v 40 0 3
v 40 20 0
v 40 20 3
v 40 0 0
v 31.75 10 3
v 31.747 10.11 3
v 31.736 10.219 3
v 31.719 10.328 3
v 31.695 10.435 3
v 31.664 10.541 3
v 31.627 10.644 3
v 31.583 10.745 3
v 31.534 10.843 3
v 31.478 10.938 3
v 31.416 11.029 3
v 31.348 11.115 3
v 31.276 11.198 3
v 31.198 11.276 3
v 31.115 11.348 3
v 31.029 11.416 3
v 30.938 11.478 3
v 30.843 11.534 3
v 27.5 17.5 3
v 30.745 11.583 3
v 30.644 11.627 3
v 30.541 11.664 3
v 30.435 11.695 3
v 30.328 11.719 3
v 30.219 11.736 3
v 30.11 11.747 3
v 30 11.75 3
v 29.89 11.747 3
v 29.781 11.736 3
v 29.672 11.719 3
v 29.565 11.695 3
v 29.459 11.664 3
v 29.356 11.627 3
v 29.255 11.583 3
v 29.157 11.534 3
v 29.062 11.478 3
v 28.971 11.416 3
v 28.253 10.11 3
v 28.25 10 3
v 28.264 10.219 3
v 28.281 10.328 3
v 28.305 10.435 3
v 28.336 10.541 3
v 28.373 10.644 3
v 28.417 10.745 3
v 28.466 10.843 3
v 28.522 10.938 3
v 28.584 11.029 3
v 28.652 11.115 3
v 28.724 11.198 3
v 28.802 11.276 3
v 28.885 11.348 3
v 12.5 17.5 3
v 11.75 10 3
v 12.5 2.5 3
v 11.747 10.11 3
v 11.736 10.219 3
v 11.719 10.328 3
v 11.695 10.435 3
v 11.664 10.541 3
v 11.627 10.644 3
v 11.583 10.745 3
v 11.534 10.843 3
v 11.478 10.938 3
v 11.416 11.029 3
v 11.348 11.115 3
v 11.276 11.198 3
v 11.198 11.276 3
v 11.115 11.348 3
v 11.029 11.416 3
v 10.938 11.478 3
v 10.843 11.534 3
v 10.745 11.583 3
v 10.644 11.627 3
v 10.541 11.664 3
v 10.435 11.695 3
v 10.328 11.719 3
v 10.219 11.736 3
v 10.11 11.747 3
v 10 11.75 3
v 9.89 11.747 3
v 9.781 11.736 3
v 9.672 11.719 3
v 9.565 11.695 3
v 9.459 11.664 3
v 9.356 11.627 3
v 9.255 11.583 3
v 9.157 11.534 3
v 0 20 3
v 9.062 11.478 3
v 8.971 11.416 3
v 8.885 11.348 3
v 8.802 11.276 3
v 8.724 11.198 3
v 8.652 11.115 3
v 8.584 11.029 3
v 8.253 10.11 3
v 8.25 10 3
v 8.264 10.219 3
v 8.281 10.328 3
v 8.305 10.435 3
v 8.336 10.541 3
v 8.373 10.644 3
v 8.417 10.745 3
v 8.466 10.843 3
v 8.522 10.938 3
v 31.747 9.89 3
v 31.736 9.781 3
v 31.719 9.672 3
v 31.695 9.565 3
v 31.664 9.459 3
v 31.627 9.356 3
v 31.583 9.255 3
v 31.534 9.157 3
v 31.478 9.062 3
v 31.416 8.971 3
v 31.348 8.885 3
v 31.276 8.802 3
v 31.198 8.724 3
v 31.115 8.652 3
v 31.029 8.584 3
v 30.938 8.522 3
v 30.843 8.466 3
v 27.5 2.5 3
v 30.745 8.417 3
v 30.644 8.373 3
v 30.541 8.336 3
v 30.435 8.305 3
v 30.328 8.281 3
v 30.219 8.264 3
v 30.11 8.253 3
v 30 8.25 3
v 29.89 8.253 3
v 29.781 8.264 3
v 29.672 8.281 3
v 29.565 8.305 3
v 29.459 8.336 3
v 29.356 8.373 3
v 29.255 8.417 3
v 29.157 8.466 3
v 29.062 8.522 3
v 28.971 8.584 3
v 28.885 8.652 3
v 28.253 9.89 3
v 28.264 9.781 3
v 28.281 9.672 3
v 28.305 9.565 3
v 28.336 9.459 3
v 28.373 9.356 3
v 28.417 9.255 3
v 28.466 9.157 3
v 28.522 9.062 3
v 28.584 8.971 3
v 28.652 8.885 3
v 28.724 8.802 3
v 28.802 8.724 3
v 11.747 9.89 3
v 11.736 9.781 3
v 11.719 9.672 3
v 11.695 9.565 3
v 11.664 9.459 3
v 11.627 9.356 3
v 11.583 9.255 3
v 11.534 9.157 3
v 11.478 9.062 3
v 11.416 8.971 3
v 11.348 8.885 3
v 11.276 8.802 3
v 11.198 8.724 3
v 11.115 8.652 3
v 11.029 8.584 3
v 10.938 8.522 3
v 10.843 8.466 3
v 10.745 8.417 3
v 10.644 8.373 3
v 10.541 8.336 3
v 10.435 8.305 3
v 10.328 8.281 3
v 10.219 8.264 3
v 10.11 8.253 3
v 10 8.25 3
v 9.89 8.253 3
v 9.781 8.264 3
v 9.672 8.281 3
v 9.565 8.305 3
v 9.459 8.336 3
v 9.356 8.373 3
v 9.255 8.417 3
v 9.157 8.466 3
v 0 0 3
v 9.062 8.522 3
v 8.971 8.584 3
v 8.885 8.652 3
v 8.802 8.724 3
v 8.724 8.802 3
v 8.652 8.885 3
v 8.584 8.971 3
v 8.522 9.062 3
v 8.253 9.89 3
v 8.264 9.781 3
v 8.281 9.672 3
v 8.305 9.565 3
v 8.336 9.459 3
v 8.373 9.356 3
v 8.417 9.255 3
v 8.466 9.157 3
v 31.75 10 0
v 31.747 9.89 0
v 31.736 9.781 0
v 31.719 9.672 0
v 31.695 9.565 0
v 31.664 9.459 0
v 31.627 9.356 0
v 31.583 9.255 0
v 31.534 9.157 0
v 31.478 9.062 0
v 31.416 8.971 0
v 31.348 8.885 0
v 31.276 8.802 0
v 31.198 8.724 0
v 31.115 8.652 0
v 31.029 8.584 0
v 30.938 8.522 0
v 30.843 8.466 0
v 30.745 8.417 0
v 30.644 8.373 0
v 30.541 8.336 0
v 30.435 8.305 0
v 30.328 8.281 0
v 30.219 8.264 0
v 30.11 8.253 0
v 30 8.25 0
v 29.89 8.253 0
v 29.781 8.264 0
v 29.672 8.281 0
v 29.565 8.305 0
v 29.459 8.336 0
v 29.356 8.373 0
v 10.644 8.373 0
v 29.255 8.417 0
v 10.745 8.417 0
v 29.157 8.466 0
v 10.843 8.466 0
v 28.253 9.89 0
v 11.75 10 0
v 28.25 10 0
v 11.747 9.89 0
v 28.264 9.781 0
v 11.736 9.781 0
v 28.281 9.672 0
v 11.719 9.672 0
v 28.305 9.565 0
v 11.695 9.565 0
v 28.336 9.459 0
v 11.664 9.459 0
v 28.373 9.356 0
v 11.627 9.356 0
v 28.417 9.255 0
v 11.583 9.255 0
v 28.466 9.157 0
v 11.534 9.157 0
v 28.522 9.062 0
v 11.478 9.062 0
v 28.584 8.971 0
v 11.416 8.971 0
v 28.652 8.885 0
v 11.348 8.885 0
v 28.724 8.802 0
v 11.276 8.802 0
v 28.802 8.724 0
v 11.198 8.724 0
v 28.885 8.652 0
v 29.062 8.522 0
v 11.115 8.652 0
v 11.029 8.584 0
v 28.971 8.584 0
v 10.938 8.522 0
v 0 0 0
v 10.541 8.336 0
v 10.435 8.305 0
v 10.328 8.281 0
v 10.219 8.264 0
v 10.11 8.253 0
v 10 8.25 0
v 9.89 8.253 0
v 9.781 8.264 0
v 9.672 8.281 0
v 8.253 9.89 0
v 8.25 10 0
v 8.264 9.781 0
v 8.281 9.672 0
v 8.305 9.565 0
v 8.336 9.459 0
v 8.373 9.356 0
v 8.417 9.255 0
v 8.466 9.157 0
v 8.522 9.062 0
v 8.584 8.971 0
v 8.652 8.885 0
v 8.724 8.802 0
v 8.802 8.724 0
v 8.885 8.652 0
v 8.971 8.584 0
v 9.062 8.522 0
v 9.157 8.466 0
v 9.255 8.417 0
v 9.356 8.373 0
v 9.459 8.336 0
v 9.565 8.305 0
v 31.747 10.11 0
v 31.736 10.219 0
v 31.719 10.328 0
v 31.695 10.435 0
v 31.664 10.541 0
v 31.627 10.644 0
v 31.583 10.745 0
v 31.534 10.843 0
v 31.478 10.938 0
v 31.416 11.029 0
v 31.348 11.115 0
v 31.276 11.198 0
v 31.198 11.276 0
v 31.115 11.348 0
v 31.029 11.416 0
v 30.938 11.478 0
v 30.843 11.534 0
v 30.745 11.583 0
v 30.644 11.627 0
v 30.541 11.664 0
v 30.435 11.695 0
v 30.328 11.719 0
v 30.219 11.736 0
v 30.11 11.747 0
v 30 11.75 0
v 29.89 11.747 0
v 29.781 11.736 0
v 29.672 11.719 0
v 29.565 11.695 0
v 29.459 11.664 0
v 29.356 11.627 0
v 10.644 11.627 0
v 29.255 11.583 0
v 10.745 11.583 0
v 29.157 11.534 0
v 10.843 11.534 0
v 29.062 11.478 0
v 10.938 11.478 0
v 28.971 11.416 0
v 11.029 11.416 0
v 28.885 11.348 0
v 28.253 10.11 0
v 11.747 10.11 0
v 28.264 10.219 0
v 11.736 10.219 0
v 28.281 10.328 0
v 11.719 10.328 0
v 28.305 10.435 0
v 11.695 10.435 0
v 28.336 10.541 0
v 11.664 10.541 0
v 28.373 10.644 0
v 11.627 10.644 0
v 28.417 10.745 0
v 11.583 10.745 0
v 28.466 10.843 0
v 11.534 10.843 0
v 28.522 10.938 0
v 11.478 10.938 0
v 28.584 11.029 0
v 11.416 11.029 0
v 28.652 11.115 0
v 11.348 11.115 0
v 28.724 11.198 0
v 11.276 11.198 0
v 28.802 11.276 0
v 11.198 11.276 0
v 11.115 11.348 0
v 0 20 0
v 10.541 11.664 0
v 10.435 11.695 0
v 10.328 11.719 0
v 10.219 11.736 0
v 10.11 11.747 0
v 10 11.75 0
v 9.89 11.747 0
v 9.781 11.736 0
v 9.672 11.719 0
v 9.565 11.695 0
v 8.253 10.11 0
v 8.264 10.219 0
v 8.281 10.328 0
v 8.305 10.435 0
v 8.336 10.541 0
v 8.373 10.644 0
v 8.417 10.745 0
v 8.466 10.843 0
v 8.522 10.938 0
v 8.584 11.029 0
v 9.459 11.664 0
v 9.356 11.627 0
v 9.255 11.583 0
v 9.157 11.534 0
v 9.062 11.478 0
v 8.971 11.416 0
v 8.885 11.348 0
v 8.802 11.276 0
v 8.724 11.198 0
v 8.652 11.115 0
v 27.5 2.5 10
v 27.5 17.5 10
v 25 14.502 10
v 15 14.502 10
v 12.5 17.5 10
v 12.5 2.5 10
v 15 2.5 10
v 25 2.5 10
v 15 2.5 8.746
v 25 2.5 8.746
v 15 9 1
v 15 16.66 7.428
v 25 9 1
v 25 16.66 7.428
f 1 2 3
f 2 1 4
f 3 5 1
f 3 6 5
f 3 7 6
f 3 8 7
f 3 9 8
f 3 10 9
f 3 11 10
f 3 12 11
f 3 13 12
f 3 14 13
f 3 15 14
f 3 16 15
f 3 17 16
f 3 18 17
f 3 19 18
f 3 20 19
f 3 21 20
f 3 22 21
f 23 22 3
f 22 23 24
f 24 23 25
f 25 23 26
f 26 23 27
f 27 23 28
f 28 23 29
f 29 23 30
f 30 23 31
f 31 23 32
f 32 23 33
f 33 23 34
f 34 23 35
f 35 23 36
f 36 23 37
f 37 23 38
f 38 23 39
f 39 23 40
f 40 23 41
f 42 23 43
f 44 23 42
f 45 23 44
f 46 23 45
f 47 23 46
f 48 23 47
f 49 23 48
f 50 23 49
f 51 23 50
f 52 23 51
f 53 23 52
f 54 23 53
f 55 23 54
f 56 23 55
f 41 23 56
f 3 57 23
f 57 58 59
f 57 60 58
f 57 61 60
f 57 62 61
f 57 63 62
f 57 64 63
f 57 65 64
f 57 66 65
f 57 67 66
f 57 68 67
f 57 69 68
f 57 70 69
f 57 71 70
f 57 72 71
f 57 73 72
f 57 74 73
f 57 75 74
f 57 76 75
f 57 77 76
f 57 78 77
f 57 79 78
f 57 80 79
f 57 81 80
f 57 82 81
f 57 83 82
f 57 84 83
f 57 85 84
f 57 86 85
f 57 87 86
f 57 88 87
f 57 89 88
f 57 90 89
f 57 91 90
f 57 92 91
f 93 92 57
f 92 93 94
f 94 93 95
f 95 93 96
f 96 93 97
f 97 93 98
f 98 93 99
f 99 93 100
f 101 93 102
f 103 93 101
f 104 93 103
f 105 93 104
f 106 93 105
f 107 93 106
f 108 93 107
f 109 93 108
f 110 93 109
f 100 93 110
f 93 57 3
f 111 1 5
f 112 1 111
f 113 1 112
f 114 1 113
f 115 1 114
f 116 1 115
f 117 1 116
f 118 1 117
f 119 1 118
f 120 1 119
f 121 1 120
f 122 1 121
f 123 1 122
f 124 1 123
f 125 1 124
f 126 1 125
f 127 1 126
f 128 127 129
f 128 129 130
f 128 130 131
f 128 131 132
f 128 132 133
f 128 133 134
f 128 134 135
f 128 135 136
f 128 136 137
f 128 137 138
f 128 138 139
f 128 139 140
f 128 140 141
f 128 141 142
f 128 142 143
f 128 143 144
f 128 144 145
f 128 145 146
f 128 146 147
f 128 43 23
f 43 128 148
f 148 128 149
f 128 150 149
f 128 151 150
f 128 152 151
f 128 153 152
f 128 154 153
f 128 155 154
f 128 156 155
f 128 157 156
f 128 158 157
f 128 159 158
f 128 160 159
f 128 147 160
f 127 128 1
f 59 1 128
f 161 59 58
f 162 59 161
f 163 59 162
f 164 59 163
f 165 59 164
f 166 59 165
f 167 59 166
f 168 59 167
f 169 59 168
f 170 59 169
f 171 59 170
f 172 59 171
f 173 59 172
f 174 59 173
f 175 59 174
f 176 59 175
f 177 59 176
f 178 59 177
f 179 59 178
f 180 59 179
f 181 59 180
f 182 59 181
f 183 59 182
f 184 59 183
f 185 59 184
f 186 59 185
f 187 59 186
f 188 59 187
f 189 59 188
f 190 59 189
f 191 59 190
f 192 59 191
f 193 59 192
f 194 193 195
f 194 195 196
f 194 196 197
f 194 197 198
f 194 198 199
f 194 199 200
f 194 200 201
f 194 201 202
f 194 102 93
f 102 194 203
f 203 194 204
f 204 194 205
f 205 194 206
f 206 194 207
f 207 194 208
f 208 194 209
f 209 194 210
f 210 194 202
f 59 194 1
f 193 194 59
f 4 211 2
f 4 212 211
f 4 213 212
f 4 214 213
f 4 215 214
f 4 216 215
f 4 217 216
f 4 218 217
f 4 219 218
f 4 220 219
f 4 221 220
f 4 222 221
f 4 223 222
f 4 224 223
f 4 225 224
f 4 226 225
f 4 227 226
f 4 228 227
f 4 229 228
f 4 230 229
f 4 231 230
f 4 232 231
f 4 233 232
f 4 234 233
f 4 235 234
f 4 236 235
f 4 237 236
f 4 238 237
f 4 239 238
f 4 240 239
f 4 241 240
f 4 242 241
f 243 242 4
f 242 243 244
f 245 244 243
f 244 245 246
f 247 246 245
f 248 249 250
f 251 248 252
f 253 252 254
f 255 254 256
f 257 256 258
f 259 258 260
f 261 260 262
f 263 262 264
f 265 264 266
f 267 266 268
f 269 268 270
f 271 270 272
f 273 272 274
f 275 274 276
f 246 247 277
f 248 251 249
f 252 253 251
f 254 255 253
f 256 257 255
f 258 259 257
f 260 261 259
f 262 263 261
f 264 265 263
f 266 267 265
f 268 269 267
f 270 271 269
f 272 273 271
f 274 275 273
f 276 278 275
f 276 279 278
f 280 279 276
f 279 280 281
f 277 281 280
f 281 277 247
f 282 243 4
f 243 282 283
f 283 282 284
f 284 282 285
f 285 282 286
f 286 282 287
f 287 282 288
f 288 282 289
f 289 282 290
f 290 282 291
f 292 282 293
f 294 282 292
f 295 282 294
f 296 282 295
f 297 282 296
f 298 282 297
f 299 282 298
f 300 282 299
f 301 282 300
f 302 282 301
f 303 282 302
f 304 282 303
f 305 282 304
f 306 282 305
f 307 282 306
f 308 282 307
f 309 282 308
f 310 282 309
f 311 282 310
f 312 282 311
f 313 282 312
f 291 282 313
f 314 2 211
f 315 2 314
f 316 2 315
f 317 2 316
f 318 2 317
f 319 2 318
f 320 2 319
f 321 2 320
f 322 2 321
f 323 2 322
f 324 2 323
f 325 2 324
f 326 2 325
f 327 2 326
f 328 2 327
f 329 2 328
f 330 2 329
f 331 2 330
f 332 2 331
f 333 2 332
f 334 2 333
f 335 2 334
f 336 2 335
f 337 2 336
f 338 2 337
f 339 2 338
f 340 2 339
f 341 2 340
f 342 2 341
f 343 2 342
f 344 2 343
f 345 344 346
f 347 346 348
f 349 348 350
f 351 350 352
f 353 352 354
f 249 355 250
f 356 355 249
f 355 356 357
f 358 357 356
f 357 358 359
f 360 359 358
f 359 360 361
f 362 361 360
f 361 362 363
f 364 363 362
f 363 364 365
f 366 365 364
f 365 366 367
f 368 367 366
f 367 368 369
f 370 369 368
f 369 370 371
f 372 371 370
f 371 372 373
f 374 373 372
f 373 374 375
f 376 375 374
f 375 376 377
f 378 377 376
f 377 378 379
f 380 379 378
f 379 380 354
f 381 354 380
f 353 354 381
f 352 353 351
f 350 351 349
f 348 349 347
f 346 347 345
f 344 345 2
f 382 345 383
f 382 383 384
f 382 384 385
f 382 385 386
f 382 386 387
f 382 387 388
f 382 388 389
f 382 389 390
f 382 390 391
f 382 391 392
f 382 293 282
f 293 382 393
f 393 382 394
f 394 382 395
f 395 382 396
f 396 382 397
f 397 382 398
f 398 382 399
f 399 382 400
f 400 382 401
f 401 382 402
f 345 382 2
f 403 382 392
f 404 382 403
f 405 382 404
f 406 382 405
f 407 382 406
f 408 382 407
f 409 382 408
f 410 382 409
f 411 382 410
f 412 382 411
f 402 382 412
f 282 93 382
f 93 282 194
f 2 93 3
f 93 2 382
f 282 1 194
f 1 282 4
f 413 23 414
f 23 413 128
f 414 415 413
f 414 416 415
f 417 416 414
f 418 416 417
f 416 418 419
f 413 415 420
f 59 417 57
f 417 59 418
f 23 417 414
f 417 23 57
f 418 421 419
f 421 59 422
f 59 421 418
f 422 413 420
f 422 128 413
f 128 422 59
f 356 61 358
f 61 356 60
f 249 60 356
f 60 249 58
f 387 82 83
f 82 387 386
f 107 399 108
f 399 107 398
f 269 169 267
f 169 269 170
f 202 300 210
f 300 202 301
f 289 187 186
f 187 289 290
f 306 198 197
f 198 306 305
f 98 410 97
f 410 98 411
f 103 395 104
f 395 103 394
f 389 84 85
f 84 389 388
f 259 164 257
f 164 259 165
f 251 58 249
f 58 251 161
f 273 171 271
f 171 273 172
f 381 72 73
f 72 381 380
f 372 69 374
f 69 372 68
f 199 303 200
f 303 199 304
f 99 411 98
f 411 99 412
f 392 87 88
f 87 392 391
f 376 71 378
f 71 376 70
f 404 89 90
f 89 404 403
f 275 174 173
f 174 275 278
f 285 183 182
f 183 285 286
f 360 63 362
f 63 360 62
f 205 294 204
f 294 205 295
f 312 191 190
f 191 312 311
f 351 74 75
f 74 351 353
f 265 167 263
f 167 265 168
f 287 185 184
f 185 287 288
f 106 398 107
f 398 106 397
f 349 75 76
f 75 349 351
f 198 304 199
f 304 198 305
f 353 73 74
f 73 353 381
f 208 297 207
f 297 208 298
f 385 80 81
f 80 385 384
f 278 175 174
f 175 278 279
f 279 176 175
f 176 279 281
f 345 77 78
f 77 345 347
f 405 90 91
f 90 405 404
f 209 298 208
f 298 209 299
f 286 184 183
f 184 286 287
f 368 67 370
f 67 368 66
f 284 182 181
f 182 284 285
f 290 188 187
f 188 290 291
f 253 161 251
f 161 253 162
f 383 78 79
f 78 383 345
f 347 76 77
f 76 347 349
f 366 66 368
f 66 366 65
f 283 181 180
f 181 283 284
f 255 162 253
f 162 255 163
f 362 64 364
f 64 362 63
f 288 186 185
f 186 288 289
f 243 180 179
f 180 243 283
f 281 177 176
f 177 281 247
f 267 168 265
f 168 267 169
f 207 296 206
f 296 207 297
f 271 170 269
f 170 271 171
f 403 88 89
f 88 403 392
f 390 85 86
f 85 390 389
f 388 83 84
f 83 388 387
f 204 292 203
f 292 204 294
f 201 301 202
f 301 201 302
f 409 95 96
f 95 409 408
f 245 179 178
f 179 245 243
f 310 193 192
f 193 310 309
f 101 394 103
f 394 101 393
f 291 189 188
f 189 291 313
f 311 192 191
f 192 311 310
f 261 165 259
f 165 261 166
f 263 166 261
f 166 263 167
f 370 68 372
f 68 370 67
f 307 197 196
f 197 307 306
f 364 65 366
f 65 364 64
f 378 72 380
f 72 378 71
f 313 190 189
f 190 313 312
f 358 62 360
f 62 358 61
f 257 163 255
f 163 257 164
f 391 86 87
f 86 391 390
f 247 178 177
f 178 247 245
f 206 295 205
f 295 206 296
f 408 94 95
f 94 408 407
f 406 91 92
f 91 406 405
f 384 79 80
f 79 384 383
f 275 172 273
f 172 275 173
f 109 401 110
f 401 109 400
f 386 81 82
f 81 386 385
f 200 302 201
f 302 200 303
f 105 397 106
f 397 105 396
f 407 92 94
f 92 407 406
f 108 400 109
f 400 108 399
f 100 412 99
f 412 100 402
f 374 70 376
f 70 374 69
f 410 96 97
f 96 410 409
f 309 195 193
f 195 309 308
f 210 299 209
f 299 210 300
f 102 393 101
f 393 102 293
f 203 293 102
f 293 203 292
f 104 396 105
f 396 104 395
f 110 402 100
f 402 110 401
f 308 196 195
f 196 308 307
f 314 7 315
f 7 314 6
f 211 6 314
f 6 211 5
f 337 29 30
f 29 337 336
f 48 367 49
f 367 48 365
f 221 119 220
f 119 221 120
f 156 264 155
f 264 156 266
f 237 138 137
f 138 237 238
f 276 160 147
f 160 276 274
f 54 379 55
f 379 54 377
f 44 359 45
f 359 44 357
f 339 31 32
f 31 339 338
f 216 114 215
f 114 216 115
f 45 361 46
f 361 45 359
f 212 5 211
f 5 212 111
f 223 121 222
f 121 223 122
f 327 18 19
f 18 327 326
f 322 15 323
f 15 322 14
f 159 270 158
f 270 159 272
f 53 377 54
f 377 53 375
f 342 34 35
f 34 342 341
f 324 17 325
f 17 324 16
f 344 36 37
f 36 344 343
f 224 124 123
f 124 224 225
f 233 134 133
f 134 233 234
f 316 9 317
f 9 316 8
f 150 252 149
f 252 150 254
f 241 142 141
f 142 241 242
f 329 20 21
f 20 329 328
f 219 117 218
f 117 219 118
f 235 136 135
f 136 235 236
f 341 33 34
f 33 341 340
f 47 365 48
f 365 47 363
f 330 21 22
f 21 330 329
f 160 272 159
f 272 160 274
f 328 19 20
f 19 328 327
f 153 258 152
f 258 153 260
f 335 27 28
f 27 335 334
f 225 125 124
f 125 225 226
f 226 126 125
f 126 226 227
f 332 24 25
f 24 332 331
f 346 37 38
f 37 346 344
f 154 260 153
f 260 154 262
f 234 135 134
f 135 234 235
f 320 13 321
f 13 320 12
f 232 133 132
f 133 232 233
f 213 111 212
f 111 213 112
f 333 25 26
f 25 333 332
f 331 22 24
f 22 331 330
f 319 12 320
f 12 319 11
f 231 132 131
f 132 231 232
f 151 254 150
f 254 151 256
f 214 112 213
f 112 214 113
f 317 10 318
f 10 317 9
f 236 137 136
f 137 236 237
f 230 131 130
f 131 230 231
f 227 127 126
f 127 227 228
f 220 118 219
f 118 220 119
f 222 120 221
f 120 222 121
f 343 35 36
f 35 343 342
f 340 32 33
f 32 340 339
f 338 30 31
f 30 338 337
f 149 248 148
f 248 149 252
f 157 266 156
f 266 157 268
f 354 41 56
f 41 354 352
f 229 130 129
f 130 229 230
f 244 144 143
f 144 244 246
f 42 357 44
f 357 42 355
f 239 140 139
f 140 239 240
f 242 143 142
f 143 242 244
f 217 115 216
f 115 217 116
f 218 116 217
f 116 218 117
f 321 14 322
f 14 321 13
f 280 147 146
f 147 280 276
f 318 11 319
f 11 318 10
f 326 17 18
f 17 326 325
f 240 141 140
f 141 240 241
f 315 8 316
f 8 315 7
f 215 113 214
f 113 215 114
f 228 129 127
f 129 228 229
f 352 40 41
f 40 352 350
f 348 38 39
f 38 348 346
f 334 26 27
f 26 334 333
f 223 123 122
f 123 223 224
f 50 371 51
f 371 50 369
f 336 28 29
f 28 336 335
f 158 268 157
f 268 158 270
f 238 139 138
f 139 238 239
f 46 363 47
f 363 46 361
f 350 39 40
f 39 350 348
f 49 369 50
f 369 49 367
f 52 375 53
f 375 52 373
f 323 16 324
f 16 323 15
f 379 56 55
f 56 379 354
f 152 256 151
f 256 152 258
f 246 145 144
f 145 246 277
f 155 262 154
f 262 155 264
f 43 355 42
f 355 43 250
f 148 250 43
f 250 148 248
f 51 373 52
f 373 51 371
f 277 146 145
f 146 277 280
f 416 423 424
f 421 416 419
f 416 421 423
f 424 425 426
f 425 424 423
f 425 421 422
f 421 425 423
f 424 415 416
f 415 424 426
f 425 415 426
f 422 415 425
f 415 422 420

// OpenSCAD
$fn=100;

bodyWidth = 20;
thickness = 7;

difference()
{
	union(){
		cube([40,bodyWidth,3]);
		translate([12.5,2.5,0]) cube([15,15,10]);
	}
	translate([10,bodyWidth/2,-1]) cylinder(h=thickness+2,r=1.75);
	translate([10+20,bodyWidth/2,-1]) cylinder(h=thickness+2,r=1.75);
	translate([15,9,1]) rotate(a=[40,0,0]) cube([10,10,50]);
}

